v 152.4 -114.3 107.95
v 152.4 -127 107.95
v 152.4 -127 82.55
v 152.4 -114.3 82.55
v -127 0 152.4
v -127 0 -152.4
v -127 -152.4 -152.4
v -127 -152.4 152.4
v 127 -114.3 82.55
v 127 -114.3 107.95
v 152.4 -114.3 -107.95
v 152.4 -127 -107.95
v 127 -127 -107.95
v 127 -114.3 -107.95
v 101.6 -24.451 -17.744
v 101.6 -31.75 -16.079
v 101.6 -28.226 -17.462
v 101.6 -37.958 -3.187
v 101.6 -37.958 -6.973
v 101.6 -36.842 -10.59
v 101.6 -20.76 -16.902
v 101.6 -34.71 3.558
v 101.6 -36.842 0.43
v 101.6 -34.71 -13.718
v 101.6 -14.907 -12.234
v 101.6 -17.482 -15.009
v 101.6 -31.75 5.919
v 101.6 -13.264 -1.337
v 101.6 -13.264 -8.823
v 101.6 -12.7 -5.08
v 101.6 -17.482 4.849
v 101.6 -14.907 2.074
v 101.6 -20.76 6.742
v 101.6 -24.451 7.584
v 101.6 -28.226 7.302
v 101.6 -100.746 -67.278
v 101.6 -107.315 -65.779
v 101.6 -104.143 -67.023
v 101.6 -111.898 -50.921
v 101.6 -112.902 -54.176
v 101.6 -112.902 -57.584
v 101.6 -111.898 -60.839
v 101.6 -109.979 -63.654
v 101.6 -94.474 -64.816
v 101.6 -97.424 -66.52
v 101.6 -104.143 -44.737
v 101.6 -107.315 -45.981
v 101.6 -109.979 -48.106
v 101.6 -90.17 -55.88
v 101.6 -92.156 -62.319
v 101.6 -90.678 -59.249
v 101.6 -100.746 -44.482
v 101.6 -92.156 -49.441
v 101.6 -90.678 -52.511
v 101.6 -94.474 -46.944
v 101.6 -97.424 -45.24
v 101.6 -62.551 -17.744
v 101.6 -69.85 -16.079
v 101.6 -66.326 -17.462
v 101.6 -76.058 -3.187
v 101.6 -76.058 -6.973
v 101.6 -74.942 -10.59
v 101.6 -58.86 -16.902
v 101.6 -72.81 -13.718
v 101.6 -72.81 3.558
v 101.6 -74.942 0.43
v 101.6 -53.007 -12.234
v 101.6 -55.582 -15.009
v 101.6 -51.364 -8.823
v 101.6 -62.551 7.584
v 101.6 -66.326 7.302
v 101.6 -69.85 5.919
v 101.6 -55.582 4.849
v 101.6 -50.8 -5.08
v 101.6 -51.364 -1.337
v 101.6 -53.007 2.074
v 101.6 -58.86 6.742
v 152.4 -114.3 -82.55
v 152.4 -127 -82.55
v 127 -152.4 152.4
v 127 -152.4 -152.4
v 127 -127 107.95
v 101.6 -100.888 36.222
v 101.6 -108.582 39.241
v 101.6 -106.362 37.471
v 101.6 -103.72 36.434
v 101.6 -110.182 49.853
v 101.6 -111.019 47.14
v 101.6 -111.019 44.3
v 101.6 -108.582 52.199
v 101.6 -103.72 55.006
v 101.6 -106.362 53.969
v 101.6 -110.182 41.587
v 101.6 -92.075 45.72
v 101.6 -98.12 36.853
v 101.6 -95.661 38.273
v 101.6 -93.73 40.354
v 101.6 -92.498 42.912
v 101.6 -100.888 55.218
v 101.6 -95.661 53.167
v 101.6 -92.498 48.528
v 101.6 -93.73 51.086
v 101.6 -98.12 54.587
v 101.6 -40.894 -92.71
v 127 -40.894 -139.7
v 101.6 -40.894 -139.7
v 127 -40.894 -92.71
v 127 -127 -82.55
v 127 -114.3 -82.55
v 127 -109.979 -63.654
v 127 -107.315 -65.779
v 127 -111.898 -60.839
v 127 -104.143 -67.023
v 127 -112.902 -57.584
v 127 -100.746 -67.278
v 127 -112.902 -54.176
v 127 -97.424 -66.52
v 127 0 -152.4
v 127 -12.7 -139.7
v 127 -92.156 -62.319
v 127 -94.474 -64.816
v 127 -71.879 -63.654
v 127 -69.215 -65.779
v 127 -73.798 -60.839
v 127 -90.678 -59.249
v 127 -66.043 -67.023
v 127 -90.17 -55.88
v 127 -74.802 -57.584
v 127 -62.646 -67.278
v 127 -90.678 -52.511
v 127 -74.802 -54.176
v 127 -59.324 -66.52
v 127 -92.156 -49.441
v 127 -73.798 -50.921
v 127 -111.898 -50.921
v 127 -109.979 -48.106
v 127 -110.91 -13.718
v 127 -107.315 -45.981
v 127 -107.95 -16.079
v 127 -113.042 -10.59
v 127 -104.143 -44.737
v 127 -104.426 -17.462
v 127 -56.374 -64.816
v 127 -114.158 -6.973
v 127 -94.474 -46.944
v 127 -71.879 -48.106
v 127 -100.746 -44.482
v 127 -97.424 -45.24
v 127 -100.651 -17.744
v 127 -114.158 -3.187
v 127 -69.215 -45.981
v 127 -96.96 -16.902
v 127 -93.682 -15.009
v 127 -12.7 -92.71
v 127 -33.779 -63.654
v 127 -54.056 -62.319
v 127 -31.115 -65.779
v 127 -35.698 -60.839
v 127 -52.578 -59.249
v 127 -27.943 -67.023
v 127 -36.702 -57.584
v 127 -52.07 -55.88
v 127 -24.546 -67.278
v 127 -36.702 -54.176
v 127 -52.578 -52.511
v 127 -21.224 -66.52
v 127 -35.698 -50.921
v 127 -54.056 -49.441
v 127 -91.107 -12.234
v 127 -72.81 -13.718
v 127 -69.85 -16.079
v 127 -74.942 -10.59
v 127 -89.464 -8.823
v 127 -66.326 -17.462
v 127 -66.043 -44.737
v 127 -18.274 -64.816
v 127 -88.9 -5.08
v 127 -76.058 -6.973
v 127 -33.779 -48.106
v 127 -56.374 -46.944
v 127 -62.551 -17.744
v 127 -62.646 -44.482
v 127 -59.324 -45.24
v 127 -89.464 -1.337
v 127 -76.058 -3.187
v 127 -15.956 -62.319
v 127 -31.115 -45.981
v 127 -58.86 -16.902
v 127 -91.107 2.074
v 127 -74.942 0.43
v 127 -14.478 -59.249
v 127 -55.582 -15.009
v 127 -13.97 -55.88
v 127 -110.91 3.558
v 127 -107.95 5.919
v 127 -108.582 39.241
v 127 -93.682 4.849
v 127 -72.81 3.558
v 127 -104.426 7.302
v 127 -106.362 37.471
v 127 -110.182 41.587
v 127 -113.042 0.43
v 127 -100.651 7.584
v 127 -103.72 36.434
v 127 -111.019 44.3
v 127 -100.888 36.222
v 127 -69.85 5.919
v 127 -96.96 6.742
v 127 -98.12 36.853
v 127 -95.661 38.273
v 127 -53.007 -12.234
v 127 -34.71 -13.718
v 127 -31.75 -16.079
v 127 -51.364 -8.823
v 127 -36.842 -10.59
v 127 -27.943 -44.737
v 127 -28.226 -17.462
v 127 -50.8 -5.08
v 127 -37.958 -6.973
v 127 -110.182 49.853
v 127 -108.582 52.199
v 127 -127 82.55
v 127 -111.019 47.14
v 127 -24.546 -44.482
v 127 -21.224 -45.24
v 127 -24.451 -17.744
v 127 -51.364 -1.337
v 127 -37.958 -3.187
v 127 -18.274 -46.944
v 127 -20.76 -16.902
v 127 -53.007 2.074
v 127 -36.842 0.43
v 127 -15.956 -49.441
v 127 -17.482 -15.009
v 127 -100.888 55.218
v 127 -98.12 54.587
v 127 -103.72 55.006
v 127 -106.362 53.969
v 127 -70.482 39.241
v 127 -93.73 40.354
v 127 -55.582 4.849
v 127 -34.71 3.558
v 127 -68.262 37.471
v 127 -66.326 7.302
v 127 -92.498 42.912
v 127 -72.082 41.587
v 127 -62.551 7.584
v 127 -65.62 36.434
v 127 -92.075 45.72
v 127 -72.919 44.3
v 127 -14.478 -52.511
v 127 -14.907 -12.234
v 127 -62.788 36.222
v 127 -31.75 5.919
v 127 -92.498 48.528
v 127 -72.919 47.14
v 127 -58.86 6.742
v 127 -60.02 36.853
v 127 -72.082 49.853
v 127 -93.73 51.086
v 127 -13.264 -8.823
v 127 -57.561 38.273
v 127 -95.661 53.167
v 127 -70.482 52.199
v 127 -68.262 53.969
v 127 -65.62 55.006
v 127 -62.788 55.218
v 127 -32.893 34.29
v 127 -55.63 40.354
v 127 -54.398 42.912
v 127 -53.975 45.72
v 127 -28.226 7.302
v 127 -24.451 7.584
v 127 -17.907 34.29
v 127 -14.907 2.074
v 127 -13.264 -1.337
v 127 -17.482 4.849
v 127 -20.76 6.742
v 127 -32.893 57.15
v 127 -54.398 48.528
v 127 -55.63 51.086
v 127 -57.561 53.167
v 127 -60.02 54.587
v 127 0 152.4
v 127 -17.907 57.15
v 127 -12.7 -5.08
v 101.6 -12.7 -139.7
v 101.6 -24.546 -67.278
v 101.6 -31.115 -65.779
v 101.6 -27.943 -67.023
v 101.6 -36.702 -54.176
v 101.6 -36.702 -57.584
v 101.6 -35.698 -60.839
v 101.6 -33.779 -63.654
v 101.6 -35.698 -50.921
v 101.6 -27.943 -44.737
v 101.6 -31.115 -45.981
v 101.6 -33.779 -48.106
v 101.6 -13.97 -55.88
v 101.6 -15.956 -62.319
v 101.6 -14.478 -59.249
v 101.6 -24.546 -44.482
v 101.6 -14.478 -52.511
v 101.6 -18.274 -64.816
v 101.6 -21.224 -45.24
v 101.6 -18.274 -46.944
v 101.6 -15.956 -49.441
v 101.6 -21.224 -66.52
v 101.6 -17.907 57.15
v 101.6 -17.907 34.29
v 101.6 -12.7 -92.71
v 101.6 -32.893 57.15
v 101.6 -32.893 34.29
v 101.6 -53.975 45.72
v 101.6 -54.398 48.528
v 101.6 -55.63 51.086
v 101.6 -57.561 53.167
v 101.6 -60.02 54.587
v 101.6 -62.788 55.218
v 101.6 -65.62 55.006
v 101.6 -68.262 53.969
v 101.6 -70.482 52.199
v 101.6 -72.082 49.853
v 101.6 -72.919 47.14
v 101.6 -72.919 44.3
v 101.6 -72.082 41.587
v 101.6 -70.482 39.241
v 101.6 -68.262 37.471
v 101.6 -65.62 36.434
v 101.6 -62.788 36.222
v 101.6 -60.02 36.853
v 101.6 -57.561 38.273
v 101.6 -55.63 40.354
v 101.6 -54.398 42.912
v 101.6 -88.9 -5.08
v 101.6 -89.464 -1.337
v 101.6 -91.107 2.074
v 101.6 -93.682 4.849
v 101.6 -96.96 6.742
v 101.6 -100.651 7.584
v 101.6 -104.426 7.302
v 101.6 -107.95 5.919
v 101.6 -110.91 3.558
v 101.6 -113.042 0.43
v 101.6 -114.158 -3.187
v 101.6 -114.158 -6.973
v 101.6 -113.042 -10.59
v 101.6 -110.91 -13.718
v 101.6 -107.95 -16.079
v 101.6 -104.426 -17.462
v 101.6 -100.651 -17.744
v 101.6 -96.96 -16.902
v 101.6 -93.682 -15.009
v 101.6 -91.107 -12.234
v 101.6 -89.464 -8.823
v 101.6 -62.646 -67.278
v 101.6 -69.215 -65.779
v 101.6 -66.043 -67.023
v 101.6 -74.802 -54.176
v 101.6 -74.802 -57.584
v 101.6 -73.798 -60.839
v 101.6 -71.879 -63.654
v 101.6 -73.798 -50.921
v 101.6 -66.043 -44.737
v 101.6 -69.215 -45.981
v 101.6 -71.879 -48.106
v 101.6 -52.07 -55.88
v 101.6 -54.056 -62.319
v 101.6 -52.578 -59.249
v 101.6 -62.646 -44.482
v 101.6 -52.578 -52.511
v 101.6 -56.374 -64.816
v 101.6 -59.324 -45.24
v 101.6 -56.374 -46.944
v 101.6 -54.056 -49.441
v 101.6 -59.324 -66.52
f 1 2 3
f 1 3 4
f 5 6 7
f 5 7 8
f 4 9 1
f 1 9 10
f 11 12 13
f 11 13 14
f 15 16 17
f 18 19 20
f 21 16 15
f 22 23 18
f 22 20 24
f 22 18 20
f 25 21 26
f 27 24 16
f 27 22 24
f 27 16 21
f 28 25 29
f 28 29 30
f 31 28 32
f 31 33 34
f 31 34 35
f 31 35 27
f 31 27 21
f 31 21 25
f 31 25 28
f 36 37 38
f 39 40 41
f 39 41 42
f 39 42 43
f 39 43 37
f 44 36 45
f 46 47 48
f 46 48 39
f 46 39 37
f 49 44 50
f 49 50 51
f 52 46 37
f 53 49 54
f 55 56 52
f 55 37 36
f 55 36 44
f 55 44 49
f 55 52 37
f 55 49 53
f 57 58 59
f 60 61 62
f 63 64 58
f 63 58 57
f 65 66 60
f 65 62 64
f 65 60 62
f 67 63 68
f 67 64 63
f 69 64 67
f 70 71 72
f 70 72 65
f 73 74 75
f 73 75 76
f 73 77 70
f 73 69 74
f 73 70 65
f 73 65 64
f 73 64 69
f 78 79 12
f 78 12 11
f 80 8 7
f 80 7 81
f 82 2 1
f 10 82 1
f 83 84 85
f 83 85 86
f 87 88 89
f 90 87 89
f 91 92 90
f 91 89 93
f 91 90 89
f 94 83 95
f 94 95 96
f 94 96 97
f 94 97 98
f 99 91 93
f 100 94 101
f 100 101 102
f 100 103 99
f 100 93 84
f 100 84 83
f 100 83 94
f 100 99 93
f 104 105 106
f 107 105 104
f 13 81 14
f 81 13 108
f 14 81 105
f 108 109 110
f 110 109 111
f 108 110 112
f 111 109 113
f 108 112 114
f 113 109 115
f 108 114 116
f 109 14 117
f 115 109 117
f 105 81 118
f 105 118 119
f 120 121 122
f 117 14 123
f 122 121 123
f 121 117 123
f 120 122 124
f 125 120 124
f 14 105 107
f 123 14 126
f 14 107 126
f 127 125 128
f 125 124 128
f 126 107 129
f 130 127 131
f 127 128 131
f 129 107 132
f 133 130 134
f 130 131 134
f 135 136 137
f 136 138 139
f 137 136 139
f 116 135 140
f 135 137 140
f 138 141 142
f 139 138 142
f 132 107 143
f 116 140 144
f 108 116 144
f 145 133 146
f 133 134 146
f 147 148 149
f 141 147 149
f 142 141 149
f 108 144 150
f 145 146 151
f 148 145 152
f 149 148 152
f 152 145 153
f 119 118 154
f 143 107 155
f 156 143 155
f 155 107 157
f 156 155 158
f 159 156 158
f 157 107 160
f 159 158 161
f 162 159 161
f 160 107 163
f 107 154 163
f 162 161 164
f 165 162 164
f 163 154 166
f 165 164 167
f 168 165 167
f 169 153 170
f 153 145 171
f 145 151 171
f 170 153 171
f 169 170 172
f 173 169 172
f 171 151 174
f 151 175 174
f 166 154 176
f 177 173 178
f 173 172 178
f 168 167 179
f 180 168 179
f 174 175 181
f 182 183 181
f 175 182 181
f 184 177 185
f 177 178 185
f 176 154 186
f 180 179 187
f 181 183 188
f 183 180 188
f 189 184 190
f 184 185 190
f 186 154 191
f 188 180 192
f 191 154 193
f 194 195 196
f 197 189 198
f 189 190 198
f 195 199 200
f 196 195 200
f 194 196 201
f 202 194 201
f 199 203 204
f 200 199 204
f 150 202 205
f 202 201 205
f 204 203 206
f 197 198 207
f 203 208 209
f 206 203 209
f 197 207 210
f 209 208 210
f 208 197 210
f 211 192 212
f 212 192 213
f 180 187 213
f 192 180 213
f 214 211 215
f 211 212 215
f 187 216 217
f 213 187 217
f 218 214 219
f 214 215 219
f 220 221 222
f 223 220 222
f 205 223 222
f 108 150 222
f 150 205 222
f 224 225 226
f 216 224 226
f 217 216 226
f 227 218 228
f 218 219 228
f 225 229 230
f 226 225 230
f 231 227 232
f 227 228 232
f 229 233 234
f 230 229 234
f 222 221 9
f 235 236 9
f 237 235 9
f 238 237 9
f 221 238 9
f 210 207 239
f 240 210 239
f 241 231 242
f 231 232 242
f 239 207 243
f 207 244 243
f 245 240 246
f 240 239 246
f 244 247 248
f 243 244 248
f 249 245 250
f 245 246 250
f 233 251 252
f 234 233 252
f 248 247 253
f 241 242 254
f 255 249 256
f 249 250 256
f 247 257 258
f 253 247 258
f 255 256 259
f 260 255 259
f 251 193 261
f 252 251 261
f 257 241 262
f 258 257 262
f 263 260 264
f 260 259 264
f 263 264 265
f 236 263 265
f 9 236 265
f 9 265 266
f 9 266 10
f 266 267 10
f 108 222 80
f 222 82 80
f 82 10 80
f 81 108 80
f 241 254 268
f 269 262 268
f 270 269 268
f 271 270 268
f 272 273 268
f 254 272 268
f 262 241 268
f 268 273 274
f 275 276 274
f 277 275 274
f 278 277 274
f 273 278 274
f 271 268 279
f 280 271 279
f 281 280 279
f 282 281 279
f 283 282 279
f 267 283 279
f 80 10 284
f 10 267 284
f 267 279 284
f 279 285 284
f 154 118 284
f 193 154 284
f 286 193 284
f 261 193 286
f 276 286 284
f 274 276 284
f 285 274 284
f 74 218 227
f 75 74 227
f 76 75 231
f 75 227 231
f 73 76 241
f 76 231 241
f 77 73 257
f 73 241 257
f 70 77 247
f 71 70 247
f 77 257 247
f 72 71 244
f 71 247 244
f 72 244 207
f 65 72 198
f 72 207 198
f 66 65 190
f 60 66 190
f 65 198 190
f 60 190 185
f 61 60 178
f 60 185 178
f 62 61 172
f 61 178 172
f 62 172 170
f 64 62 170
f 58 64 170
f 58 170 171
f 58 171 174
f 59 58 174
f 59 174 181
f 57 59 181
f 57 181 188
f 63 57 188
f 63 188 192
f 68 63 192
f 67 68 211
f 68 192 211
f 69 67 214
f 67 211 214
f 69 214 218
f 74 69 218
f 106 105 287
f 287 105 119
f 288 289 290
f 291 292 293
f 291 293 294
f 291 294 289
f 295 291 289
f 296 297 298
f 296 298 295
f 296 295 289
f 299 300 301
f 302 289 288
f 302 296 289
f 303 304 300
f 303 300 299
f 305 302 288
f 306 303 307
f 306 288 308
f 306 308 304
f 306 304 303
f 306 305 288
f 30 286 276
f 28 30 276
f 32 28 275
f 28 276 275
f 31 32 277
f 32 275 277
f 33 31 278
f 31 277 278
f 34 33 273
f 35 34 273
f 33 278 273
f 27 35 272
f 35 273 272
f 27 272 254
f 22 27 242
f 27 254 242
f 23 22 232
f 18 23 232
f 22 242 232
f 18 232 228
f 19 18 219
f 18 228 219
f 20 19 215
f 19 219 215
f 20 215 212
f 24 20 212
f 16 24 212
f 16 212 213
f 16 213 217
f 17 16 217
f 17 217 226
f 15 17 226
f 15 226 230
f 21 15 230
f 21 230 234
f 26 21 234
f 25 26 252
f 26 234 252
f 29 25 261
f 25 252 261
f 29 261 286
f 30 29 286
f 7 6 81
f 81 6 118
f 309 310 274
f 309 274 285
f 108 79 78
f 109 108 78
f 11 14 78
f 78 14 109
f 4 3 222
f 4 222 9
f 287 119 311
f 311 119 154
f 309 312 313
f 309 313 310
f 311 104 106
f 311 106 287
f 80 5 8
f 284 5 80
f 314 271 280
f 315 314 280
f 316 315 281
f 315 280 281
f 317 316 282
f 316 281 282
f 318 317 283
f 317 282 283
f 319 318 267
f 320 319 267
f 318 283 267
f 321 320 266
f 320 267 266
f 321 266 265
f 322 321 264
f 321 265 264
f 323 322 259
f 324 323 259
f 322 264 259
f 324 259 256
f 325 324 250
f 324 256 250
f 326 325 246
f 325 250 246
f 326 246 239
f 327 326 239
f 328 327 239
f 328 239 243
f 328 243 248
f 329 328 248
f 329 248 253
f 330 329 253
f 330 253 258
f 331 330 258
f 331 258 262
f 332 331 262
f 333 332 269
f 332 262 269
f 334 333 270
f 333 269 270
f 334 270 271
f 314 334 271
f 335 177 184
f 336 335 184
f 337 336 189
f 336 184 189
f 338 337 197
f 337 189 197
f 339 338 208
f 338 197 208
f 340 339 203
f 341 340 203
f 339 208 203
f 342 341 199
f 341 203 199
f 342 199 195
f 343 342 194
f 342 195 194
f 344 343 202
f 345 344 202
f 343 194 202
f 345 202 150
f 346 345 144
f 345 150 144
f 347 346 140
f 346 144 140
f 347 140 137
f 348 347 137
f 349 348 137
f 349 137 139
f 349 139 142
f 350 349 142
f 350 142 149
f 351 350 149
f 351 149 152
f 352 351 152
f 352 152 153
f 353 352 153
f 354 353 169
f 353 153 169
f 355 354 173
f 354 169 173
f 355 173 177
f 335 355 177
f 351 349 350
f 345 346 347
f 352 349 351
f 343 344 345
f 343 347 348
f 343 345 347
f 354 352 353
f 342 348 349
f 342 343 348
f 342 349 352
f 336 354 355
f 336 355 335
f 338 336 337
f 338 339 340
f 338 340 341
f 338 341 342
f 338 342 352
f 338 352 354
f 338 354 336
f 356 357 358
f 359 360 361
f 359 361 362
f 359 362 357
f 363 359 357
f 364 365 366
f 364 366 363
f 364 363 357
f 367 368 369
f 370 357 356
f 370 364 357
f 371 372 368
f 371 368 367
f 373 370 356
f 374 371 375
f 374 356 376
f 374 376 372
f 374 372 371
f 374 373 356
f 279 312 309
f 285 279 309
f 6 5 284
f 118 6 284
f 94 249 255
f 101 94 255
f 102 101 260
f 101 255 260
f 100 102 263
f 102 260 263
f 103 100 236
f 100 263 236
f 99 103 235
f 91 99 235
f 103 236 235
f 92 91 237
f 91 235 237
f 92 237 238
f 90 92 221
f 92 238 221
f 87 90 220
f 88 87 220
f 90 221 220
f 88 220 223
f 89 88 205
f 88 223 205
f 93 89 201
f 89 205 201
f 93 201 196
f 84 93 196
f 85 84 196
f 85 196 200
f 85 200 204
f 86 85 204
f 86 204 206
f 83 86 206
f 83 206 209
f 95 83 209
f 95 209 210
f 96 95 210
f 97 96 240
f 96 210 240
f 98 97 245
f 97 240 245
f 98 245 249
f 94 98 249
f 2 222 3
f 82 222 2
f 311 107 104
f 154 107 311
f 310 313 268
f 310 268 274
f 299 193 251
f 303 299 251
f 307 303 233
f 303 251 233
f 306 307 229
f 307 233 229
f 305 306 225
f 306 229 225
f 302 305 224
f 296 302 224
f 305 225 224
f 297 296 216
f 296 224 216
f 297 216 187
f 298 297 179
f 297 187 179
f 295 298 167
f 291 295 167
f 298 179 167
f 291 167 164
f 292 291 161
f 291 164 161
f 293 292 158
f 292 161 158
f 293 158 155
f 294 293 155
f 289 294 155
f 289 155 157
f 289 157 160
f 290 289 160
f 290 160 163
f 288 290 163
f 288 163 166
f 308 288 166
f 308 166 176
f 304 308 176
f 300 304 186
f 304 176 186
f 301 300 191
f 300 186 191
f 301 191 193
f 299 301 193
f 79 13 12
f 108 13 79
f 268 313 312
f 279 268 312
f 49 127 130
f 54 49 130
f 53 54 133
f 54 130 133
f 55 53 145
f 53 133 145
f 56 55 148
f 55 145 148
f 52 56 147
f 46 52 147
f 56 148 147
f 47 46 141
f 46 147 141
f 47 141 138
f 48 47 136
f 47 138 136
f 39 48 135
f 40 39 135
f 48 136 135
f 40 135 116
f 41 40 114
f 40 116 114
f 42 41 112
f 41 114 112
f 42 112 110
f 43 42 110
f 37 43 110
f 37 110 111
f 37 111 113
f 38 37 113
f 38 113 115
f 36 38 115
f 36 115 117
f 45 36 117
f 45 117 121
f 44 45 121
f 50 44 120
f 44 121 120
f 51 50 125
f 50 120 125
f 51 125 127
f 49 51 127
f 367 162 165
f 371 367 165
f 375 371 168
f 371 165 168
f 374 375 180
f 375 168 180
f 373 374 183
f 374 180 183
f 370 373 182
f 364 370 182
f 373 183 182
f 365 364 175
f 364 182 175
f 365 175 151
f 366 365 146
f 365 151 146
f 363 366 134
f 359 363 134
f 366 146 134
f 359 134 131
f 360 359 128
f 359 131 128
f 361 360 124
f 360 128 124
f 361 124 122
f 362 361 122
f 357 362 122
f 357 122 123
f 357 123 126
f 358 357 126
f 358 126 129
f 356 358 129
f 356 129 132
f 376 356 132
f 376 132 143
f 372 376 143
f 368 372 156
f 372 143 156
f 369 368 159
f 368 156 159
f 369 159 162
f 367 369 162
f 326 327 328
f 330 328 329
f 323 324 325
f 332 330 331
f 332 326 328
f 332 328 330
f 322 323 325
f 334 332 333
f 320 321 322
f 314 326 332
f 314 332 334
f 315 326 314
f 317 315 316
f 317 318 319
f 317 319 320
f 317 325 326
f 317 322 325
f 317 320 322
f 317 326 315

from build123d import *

# Parameters (mm, degrees)
F0_W     = 254
F0_H     = 304.8
F1_DEPTH = 152.4
F2_W     = 12.7
F2_H     = 25.4
F3_DEPTH = 25.4
F4_R     = 12.7
F4_R_2   = 11.43
F4_W     = 28.194
F4_H     = 46.99
F4_W_2   = 14.986
F4_H_2   = 22.86
F4_R_3   = 9.525
F5_DEPTH = 25.4


with BuildPart() as f1:
    # F0 (on Front) → F1 (new body)
    with BuildSketch(Plane.XZ):
        Rectangle(F0_W, F0_H)
    extrude(amount=F1_DEPTH)

    # F2 (on face) → F3 (join)
    with BuildSketch(Plane.YZ.offset(127)):
        with Locations((-120.65, 95.25)):
            Rectangle(F2_W, F2_H)
        with Locations((-120.65, -95.25)):
            Rectangle(F2_W, F2_H)
    extrude(amount=F3_DEPTH)

    # F4 (on face) → F5 (cut)
    with BuildSketch(Plane.YZ.offset(127)):
        with Locations((-101.6, -5.08)):
            Circle(F4_R)
        with Locations((-63.5, -5.08)):
            Circle(F4_R)
        with Locations((-25.4, -5.08)):
            Circle(F4_R)
        with Locations((-101.6, -55.88)):
            Circle(F4_R_2)
        with Locations((-63.5, -55.88)):
            Circle(F4_R_2)
        with Locations((-25.4, -55.88)):
            Circle(F4_R_2)
        with Locations((-26.797, -116.205)):
            Rectangle(F4_W, F4_H)
        with Locations((-25.4, 45.72)):
            Rectangle(F4_W_2, F4_H_2)
        with Locations((-101.6, 45.72)):
            Circle(F4_R_3)
        with Locations((-63.5, 45.72)):
            Circle(F4_R_3)
    extrude(amount=-F5_DEPTH, mode=Mode.SUBTRACT)


solid = f1.part
